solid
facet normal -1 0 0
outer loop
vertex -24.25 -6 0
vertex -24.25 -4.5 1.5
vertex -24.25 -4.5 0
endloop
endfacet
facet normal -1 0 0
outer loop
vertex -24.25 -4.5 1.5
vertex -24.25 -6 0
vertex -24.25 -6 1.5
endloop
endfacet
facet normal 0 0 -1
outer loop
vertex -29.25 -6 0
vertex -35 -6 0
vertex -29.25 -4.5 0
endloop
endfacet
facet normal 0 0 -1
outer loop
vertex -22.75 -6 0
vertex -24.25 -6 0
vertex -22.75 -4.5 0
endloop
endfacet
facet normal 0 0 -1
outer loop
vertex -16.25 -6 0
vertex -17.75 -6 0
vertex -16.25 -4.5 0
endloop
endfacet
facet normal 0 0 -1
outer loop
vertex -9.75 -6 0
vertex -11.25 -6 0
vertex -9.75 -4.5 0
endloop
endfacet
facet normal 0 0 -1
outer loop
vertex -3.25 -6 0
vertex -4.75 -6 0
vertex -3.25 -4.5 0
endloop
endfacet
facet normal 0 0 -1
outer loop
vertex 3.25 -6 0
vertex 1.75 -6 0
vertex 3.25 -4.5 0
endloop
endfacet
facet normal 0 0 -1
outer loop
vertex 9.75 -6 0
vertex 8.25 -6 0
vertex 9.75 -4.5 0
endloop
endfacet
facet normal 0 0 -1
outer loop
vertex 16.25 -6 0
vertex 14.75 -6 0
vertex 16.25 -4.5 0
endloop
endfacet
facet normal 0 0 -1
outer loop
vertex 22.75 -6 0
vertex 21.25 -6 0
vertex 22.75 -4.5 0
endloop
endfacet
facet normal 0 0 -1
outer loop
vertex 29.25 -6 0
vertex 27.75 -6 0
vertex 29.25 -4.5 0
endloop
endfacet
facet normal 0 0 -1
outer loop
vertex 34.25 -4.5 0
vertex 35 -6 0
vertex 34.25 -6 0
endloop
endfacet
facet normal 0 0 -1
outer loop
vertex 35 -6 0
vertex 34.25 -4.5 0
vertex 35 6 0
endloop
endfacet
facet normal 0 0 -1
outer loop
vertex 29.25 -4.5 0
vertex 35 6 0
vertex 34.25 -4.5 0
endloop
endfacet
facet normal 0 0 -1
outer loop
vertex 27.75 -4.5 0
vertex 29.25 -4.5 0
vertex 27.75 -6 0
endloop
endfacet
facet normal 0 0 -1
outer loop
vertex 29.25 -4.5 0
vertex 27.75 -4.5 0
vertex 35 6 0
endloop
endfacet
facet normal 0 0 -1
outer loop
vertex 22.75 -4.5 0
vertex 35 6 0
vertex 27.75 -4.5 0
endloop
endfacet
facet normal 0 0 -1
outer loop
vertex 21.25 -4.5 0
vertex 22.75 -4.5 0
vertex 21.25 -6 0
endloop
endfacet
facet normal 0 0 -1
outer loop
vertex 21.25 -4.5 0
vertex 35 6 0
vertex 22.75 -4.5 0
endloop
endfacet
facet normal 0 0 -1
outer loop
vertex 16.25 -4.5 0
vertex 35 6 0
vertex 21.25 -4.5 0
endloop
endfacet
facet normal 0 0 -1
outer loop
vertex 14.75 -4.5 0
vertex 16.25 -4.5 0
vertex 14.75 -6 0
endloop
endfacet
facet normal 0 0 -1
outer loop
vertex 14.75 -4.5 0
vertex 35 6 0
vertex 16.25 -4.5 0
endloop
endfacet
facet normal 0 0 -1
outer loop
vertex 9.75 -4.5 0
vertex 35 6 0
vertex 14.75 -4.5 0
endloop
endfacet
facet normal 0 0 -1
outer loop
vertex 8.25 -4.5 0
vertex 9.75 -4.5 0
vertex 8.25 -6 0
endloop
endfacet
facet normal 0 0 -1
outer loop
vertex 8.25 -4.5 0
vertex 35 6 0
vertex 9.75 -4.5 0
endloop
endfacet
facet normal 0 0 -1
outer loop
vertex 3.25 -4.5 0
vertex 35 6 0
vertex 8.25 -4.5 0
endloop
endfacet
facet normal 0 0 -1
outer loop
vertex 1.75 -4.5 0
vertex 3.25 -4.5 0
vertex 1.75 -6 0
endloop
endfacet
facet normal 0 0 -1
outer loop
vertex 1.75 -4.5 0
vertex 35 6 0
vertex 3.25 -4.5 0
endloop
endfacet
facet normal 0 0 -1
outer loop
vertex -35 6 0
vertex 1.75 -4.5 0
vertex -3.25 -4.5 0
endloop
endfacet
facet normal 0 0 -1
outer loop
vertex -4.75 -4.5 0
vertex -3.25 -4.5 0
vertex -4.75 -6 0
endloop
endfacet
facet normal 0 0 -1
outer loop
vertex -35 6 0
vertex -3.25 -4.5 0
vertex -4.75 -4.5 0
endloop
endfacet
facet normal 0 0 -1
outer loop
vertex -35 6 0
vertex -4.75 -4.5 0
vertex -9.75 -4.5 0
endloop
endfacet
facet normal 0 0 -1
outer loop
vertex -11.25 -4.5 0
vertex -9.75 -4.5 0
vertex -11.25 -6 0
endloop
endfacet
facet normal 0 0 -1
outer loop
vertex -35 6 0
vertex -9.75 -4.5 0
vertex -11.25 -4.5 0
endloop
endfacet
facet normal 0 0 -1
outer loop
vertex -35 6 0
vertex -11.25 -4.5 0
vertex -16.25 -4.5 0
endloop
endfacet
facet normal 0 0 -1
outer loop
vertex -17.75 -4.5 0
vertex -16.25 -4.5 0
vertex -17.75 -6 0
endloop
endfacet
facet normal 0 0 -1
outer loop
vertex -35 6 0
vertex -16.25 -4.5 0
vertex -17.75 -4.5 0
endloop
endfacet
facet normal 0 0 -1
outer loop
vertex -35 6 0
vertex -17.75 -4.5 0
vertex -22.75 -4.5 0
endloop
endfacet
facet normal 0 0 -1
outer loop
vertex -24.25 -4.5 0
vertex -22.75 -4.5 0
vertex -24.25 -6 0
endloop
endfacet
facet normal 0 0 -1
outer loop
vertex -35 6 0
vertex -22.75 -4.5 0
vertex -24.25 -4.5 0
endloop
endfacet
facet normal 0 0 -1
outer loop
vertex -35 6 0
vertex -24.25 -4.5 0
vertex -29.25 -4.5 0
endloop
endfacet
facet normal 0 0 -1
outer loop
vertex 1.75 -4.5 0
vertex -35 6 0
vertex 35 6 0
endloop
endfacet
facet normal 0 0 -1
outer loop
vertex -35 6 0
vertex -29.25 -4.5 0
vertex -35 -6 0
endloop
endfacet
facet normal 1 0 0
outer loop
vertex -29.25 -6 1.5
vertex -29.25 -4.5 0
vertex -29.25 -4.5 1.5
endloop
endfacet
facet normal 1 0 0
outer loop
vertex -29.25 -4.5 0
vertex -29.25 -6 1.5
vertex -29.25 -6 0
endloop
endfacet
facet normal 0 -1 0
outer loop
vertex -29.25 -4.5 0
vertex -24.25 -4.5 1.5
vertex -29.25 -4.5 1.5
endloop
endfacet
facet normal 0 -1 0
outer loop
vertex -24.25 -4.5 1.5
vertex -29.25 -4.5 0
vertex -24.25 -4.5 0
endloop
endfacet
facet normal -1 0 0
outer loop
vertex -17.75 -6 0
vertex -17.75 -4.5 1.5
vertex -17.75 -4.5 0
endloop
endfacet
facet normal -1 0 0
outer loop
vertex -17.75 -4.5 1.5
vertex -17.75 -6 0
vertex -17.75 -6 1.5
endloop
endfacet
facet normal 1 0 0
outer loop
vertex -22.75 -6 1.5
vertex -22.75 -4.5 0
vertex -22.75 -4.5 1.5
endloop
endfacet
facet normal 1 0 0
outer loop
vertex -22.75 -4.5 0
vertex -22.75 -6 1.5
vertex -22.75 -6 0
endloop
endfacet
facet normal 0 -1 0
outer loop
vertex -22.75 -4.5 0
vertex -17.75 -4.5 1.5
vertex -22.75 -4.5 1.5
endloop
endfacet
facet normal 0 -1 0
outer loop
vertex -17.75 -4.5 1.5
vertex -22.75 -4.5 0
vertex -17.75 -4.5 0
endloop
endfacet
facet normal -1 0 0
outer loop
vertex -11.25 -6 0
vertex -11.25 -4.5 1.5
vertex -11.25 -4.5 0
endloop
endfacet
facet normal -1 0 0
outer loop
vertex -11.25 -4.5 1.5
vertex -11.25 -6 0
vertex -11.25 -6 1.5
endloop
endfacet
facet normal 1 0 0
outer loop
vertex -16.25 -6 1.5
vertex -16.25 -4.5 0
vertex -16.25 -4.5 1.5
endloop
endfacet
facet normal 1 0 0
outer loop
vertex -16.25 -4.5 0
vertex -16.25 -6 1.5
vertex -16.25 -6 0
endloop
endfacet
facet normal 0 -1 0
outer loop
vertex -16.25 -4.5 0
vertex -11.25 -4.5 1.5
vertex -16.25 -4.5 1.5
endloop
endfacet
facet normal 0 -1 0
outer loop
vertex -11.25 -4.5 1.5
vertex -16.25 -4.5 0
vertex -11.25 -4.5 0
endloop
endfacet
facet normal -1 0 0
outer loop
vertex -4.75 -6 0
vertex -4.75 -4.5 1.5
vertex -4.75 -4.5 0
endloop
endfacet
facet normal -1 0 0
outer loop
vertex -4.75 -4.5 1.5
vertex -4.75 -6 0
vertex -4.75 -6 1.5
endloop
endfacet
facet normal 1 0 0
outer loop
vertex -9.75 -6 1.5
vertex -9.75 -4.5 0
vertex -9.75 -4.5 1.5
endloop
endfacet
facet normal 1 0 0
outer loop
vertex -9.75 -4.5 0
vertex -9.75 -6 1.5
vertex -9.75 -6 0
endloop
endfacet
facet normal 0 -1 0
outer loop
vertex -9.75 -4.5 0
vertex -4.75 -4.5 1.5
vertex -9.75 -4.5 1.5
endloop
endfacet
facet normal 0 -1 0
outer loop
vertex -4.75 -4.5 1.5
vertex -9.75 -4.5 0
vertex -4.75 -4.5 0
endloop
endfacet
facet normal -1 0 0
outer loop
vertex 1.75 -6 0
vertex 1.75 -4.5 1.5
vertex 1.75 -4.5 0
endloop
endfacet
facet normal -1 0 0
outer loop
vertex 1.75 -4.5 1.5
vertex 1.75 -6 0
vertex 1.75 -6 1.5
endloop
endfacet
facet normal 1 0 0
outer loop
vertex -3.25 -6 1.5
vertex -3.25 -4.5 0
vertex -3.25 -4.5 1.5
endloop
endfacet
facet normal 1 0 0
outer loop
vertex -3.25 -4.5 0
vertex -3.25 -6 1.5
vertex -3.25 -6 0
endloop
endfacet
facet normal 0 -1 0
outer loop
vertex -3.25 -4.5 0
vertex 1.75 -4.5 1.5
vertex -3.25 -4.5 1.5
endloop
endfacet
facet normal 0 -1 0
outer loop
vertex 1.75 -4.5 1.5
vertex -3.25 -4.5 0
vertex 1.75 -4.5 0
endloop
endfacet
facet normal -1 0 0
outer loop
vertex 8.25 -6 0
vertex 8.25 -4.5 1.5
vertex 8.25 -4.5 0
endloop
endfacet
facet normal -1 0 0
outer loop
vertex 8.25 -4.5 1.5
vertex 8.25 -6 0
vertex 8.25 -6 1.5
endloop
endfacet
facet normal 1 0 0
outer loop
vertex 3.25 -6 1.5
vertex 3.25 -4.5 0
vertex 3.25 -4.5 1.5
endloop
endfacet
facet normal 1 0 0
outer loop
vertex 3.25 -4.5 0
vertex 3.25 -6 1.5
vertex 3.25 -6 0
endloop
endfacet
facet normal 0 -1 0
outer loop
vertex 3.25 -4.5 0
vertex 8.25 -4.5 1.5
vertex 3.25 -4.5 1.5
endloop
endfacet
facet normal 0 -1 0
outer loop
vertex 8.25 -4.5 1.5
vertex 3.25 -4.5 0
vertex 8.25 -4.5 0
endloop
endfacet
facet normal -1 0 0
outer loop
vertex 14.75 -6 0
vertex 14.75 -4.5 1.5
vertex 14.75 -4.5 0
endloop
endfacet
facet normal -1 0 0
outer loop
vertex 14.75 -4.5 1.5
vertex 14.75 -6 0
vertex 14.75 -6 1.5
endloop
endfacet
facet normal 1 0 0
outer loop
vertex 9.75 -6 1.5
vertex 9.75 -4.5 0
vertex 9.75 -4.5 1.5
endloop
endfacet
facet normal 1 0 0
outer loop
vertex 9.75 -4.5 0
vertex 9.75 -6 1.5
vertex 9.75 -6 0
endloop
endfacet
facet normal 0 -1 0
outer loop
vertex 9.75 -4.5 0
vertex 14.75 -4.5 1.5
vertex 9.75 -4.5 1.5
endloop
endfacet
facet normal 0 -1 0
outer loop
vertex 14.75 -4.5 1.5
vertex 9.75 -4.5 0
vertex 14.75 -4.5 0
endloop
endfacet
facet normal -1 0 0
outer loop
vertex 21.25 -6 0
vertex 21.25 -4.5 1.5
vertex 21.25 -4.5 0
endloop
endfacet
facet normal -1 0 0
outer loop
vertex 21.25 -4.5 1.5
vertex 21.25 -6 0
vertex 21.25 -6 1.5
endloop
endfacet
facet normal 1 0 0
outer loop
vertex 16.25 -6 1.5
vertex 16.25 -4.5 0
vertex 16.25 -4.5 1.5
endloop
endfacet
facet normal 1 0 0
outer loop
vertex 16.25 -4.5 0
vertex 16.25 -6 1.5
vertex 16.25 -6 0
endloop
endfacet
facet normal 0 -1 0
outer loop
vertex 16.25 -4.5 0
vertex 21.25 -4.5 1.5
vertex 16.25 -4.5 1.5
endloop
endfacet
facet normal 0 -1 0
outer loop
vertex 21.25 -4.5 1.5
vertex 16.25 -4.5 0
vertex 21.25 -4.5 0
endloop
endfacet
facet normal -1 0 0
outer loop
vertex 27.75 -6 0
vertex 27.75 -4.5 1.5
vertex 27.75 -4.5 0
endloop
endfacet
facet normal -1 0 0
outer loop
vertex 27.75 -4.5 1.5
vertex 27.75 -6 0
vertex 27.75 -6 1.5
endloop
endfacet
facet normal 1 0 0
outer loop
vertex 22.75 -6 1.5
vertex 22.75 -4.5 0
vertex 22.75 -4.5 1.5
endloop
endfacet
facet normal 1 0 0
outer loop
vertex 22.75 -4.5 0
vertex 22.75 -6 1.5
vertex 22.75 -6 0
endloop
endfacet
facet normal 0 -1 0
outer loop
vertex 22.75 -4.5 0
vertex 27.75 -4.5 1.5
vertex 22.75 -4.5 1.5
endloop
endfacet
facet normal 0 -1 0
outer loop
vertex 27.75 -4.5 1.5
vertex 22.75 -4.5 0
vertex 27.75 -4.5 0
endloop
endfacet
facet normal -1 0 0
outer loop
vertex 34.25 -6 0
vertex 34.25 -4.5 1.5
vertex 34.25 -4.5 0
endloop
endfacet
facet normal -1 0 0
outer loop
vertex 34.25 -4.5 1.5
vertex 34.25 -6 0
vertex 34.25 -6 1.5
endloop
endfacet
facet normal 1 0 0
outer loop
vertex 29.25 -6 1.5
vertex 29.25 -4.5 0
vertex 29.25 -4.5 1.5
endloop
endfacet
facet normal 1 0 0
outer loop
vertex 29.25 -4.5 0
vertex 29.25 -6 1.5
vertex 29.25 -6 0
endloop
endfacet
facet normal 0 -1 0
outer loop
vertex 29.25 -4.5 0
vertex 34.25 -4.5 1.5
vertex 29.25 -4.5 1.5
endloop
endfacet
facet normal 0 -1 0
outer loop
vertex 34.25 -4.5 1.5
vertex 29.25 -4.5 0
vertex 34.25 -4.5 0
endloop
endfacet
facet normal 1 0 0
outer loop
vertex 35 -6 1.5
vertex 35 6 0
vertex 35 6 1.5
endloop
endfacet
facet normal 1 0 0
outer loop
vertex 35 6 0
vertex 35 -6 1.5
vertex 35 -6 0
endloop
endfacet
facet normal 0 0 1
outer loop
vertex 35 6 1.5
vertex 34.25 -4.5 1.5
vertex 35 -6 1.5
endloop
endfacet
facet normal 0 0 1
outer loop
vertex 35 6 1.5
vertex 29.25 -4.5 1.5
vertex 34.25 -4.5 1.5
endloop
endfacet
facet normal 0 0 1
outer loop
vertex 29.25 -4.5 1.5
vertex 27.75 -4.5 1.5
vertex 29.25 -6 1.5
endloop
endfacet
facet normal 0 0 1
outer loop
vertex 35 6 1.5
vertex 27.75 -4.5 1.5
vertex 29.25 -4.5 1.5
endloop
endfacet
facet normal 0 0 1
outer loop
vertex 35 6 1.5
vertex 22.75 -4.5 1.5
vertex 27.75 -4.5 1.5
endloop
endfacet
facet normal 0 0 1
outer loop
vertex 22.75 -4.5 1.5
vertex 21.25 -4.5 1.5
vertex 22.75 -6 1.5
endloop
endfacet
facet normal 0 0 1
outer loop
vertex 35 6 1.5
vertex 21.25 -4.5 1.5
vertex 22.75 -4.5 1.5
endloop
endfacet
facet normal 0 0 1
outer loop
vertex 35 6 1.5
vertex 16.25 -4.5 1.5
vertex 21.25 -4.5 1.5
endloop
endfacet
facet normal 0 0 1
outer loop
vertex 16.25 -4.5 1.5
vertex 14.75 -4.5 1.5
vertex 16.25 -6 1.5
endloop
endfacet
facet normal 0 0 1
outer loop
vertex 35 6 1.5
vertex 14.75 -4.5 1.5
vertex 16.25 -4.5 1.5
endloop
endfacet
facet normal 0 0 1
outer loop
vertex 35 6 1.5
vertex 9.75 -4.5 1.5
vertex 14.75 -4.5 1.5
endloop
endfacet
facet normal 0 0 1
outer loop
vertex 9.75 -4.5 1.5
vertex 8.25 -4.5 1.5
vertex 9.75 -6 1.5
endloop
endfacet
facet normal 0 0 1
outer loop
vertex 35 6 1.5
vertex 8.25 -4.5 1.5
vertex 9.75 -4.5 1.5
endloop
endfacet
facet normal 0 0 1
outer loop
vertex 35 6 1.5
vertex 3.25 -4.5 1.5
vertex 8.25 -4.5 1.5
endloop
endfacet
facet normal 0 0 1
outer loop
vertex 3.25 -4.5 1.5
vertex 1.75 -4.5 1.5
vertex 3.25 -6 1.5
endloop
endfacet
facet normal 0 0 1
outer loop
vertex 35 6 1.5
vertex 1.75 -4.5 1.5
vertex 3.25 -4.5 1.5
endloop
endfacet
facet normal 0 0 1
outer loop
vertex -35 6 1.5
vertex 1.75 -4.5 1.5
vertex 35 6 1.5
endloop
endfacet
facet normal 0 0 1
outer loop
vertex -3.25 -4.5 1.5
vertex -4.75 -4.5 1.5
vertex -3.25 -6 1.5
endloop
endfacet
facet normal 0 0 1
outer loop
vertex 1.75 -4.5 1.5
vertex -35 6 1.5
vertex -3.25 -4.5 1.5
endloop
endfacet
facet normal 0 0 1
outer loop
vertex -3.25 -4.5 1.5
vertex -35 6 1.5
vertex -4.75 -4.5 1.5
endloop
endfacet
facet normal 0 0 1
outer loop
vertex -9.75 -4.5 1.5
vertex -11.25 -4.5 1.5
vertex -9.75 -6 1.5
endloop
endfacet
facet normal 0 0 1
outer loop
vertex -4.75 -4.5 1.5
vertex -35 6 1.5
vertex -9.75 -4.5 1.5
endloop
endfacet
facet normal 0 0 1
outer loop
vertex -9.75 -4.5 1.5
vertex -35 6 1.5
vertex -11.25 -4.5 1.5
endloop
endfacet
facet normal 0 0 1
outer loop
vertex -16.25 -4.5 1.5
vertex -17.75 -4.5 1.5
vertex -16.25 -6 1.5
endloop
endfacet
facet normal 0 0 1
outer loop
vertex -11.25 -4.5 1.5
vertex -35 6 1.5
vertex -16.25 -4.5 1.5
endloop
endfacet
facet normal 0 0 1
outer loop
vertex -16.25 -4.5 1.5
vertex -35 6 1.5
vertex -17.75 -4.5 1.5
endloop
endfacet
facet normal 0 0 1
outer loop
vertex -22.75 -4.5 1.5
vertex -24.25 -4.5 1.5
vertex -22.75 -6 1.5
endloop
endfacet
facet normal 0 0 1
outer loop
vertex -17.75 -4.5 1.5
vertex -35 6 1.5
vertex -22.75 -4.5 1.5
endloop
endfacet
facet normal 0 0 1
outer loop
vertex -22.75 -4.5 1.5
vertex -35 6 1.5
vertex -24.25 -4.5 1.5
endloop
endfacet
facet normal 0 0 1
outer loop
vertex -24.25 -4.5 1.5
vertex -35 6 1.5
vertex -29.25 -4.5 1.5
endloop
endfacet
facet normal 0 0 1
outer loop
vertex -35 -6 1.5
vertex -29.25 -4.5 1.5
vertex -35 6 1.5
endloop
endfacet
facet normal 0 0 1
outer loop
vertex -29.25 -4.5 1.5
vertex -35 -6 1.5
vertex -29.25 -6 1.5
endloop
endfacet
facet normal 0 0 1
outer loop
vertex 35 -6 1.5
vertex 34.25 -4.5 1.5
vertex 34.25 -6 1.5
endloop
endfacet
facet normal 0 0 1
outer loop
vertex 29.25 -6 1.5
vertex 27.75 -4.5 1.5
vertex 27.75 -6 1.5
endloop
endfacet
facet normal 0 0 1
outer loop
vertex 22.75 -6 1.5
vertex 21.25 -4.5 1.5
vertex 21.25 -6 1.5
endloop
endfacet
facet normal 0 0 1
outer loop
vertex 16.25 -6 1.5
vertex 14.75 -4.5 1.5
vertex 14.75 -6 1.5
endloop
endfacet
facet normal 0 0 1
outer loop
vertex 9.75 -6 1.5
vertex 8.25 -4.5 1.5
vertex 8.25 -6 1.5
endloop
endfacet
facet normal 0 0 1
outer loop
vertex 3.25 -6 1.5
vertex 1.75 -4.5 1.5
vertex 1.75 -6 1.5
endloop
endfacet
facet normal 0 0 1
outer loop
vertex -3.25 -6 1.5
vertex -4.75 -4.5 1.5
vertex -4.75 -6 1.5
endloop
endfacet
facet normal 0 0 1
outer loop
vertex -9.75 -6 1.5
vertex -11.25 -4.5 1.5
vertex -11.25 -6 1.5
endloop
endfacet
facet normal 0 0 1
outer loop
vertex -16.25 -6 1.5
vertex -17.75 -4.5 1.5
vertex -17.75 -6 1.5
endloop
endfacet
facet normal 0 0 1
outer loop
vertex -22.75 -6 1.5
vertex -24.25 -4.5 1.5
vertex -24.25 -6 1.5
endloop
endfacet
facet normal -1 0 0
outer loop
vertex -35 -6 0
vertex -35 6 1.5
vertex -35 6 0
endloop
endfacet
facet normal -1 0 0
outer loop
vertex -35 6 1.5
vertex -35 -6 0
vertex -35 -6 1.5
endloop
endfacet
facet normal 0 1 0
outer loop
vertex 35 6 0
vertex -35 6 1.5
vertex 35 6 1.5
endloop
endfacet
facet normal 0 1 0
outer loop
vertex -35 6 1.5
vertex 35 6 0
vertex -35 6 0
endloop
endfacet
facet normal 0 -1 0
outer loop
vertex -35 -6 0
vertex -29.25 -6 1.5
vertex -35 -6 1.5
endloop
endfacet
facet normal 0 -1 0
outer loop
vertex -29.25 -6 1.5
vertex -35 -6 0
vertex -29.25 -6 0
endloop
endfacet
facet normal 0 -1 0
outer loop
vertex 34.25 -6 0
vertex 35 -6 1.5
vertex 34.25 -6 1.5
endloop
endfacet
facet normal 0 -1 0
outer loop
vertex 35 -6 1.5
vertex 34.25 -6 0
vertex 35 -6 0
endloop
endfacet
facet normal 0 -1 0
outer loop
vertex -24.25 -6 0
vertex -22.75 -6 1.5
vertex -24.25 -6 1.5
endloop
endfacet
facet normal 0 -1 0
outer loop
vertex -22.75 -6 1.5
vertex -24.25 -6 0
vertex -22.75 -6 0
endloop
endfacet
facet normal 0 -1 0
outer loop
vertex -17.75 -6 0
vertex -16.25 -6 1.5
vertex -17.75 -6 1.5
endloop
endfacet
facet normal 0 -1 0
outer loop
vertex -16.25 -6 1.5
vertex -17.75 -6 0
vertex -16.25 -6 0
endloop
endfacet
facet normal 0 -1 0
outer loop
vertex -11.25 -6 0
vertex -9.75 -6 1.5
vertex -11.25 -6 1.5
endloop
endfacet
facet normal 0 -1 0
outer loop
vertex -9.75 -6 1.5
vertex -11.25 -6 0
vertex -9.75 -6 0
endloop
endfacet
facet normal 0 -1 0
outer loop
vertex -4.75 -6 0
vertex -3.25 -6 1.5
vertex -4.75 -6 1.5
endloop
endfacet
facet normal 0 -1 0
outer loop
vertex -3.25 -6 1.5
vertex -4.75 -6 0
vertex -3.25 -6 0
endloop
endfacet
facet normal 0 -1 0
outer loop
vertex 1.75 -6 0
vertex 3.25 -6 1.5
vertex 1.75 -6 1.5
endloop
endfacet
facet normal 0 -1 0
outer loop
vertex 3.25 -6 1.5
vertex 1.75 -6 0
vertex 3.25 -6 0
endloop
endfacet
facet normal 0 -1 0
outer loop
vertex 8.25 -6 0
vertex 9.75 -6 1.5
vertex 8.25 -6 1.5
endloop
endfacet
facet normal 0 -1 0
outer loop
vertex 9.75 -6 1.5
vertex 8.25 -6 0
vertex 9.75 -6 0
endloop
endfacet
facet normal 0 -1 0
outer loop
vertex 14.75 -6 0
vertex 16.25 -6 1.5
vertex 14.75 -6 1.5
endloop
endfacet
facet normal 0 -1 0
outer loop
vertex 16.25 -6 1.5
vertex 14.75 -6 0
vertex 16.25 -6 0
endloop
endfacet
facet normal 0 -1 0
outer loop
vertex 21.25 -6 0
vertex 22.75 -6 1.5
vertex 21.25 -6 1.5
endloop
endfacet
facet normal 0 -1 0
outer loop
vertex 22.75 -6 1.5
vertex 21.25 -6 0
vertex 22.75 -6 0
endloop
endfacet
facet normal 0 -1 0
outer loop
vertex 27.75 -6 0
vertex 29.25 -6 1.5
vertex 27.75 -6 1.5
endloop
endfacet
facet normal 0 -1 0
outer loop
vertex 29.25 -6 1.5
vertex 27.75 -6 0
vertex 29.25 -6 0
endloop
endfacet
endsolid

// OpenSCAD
// 10-well agarose gel comb (printed lying flat)
// Units: mm

$fn = 64;

// --- Spine (back bar) ---
spine_len   = 70;   // spine length along X
spine_wid   = 12;   // spine width along Y
spine_thk   = 1.5;  // plate thickness along Z

// --- Teeth ---
tooth_count = 10;   // number of wells
tooth_w     = 5.0;  // tooth width along X
tooth_l     = 12;   // tooth length along Y (into the gel)
gaps        = 1.5;  // centre-to-centre spacing of teeth (X)

// --- Derived ---
pitch      = tooth_w + gaps;  // centre-to-centre tooth spacing
overhang   = tooth_l - spine_thk; // tooth extension above the plate top face
eps        = 0.5;               // cutter overshoot past faces

// X position of the first tooth so the row is centred on the spine
first_x = -(tooth_count - 1) * pitch / 2;

difference() {
    // Base plate: spine + teeth
    translate([-spine_len / 2, -spine_wid / 2, 0])
        cube([spine_len, spine_wid, spine_thk]);

    for (i = [0 : tooth_count - 1])
        translate([first_x + i * pitch, -spine_wid / 2 - overhang, 0])
            cube([tooth_w, tooth_l, spine_thk + overhang + eps]);
}
